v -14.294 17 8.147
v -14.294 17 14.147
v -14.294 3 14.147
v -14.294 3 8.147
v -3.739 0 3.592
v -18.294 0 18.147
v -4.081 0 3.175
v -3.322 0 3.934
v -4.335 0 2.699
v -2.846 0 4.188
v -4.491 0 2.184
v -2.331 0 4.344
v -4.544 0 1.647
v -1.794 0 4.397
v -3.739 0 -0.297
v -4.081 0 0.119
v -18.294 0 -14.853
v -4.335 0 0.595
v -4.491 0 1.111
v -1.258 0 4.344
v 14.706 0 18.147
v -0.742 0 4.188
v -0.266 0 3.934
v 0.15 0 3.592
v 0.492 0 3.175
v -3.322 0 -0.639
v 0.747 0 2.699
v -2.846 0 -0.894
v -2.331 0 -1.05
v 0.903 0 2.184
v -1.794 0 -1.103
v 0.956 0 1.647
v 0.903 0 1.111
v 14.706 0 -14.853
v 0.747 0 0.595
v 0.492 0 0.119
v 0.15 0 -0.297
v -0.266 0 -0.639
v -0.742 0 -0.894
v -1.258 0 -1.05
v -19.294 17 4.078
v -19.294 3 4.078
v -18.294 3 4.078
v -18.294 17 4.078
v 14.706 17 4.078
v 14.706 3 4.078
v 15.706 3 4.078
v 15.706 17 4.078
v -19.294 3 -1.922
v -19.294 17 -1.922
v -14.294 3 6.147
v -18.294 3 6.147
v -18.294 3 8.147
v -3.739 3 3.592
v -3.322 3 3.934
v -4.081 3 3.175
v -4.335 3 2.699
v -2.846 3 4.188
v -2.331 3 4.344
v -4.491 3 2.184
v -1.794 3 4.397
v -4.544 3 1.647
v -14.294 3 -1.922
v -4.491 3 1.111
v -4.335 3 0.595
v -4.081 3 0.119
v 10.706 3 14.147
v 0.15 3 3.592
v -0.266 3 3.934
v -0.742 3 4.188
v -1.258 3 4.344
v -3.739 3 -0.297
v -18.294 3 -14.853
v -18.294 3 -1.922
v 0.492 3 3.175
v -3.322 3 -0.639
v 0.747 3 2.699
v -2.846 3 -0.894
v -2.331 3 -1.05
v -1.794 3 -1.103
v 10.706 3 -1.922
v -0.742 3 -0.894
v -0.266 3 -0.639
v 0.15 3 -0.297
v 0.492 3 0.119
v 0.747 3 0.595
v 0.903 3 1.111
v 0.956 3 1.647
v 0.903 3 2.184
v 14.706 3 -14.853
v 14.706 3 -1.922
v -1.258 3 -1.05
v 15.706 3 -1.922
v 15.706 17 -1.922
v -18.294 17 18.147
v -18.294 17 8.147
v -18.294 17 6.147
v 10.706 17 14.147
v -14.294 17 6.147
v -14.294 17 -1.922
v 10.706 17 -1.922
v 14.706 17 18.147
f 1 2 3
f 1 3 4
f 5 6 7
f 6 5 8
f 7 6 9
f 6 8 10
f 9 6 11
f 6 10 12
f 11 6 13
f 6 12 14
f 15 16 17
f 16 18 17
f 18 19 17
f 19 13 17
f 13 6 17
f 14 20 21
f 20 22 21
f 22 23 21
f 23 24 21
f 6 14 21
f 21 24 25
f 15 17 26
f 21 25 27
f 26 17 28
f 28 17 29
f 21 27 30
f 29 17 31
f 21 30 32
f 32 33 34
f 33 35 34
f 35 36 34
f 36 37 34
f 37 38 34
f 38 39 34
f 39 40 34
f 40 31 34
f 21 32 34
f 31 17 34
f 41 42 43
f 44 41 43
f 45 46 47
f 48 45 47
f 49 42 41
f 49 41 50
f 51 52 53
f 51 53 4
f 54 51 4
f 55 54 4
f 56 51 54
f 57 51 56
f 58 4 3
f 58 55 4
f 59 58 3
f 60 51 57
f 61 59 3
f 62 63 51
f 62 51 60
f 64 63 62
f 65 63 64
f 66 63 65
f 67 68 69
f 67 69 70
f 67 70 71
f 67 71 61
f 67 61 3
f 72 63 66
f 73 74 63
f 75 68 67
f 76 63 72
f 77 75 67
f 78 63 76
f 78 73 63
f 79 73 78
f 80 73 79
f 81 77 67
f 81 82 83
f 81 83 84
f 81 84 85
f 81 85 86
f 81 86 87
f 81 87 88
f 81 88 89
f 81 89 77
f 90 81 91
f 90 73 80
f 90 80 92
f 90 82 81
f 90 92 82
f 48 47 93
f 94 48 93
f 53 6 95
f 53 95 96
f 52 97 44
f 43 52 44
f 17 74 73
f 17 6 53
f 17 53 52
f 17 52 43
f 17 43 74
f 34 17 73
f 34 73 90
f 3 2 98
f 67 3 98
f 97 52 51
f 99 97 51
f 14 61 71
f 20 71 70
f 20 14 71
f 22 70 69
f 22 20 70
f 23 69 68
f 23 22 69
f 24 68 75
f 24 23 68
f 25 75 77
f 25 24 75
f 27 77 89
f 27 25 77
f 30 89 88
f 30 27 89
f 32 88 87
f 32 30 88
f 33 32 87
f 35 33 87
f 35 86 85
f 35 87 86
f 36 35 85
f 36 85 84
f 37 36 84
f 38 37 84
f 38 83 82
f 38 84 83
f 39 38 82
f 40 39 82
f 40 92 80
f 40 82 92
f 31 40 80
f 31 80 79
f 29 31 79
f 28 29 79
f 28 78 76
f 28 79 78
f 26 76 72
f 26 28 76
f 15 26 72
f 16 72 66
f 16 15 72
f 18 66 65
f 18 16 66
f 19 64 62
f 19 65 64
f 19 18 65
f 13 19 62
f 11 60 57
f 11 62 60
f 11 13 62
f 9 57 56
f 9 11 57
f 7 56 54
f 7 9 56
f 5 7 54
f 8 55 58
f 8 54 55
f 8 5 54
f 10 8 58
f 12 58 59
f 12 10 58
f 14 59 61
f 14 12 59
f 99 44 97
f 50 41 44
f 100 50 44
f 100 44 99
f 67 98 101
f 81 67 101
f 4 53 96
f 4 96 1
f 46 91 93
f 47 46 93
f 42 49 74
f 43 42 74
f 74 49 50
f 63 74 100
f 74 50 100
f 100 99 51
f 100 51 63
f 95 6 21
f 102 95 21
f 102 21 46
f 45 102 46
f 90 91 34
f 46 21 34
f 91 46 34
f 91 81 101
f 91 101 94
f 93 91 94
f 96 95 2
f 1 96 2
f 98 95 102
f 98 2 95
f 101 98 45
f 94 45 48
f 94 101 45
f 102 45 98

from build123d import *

# Parameters (mm, degrees)
SKETCH1_W           = 33
SKETCH1_H           = 33
SKETCH1_R           = 2.75
BOSS_EXTRUDE1_DEPTH = 17
SKETCH2_W           = 25
SKETCH2_H           = 25
CUT_EXTRUDE2_DEPTH  = 14
SKETCH3_W           = 4
SKETCH3_H           = 3
CUT_EXTRUDE3_DEPTH  = 14
SKETCH4_W           = 15.227626713
SKETCH4_H           = 4
CUT_EXTRUDE4_DEPTH  = 14
SKETCH5_W           = 4
SKETCH5_H           = 9.93135505
CUT_EXTRUDE5_DEPTH  = 14
SKETCH6_W           = 27.732245768
SKETCH6_H           = 12.796931656
CUT_EXTRUDE6_DEPTH  = 14
SKETCH7_W           = 1
SKETCH7_H           = 6
BOSS_EXTRUDE2_DEPTH = 14
SKETCH8_W           = 4
SKETCH8_H           = 2
CUT_EXTRUDE7_DEPTH  = 14


with BuildPart() as part:
    # Sketch1 → Boss-Extrude1 (new body)
    with BuildSketch(Plane(origin=(0, 0, 0), x_dir=(1, 0, 0), z_dir=(0, 1, 0))):
        with Locations((-1.794117647, -1.647058824)):
            Rectangle(SKETCH1_W, SKETCH1_H)
        with Locations(Location((-1.794117647, -1.647058824, 0), (0, 0, 270))):
            Circle(SKETCH1_R, mode=Mode.SUBTRACT)
    extrude(amount=BOSS_EXTRUDE1_DEPTH)

    # Sketch2 → Cut-Extrude2 (cut)
    with BuildSketch(Plane(origin=(0, 17, 0), x_dir=(1, 0, 0), z_dir=(0, 1, 0))):
        with Locations((-1.794117647, -1.647058824)):
            Rectangle(SKETCH2_W, SKETCH2_H)
    extrude(amount=-CUT_EXTRUDE2_DEPTH, mode=Mode.SUBTRACT)

    # Sketch3 → Cut-Extrude3 (cut)
    with BuildSketch(Plane(origin=(0, 17, 0), x_dir=(1, 0, 0), z_dir=(0, 1, 0))):
        with Locations((12.705882353, 3.421586126)):
            Rectangle(SKETCH3_W, SKETCH3_H)
        with Locations((-16.294117647, 3.421586126)):
            Rectangle(SKETCH3_W, SKETCH3_H)
    extrude(amount=-CUT_EXTRUDE3_DEPTH, mode=Mode.SUBTRACT)

    # Sketch4 → Cut-Extrude4 (cut)
    with BuildSketch(Plane(origin=(0, 17, 0), x_dir=(1, 0, 0), z_dir=(0, 1, 0))):
        with Locations((3.092068996, 12.852941176)):
            Rectangle(SKETCH4_W, SKETCH4_H)
    extrude(amount=-CUT_EXTRUDE4_DEPTH, mode=Mode.SUBTRACT)

    # Sketch5 → Cut-Extrude5 (cut)
    with BuildSketch(Plane(origin=(0, 17, 0), x_dir=(1, 0, 0), z_dir=(0, 1, 0))):
        with Locations((12.705882353, 9.887263651)):
            Rectangle(SKETCH5_W, SKETCH5_H)
    extrude(amount=-CUT_EXTRUDE5_DEPTH, mode=Mode.SUBTRACT)

    # Sketch6 → Cut-Extrude6 (cut)
    with BuildSketch(Plane(origin=(0, 17, 0), x_dir=(1, 0, 0), z_dir=(0, 1, 0))):
        with Locations((-12.170590875, 9.919039286)):
            Rectangle(SKETCH6_W, SKETCH6_H)
    extrude(amount=-CUT_EXTRUDE6_DEPTH, mode=Mode.SUBTRACT)

    # Sketch7 → Boss-Extrude2 (add)
    with BuildSketch(Plane(origin=(0, 3, 0), x_dir=(1, 0, 0), z_dir=(0, 1, 0))):
        with Locations((15.205882353, -1.078413874)):
            Rectangle(SKETCH7_W, SKETCH7_H)
        with Locations((-18.794117647, -1.078413874)):
            Rectangle(SKETCH7_W, SKETCH7_H)
    extrude(amount=BOSS_EXTRUDE2_DEPTH)

    # Sketch8 → Cut-Extrude7 (cut)
    with BuildSketch(Plane(origin=(0, 17, 0), x_dir=(1, 0, 0), z_dir=(0, 1, 0))):
        with Locations((-16.294117647, -7.147058824)):
            Rectangle(SKETCH8_W, SKETCH8_H)
    extrude(amount=-CUT_EXTRUDE7_DEPTH, mode=Mode.SUBTRACT)


solid = part.part
